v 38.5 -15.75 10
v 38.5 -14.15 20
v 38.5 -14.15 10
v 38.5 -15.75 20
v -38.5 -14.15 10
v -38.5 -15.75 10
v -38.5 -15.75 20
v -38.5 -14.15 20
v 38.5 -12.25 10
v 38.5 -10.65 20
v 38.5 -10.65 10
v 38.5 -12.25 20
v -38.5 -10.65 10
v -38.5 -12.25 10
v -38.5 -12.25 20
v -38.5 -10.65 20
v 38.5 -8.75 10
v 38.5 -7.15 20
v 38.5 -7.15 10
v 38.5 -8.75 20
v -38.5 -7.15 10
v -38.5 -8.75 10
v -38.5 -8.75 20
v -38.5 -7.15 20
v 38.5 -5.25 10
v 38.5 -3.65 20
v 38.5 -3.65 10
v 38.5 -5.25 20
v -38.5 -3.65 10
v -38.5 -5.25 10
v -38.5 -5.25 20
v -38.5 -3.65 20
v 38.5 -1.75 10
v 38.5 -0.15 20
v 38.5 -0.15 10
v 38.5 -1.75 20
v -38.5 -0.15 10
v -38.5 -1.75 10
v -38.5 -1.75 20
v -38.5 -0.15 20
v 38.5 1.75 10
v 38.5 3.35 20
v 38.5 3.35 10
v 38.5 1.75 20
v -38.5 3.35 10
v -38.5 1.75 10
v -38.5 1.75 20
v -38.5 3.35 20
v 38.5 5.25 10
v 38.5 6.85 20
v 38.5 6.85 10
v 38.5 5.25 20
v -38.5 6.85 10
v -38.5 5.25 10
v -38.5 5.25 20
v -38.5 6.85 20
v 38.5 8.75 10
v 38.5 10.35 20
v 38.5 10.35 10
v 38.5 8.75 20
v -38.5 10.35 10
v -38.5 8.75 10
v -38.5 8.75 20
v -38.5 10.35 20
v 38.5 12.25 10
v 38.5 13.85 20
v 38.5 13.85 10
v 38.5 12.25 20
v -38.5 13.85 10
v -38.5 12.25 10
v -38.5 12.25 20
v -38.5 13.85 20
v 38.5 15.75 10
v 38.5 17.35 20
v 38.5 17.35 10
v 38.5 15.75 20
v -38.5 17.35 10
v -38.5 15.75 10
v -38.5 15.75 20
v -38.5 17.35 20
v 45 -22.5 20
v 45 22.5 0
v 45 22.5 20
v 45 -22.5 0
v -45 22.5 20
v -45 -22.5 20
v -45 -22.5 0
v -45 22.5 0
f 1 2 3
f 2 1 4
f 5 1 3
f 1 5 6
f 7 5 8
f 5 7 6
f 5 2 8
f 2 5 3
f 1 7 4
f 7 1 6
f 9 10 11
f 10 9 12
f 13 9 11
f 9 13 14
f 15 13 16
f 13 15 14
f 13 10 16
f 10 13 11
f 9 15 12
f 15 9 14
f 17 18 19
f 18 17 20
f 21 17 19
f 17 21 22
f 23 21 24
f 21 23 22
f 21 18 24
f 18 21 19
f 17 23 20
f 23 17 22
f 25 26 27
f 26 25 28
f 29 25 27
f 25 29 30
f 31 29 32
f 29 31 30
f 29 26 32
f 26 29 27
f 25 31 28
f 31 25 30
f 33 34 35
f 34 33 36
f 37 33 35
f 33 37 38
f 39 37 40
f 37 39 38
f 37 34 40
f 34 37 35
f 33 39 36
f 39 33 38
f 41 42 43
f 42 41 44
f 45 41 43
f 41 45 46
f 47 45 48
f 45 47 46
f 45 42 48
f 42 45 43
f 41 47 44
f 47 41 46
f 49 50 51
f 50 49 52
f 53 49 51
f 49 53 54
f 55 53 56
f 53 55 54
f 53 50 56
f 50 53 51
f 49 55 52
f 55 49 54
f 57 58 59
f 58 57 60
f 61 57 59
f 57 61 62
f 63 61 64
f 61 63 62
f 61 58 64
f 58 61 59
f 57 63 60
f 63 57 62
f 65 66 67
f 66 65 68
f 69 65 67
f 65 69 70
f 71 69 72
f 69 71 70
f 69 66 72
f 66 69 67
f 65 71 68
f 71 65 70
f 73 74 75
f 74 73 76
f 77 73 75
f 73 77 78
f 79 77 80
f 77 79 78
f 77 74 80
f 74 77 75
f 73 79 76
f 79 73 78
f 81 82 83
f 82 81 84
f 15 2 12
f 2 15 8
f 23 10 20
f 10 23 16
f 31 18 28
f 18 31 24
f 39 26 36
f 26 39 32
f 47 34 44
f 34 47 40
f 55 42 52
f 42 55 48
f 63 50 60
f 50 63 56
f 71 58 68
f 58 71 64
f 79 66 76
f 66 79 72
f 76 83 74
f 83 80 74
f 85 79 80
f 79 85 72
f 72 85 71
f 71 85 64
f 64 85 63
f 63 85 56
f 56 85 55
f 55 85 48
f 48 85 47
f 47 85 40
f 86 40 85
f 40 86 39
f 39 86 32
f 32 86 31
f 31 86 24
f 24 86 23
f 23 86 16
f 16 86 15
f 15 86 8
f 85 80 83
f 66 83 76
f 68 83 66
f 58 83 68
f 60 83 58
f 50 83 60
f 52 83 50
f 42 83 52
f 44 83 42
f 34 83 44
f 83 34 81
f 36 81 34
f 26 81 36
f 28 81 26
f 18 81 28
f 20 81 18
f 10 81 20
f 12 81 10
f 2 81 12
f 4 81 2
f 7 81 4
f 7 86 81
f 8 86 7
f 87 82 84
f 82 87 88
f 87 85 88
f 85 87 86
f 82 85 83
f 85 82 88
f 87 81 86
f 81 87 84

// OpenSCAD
// Microscope slide drying rack
// Print orientation: base block on XY plane, slots open upward (+Z)

// ---------- Parameters ----------
block_len   = 90;    // block length along X (mm)
block_wid   = 45;    // block width along Y (mm)
block_ht    = 20;    // block height along Z (mm)

slot_count  = 10;    // number of slide slots
slot_len    = 77;    // slot length along X (mm)
slot_wid    = 1.6;   // slot width along Y (mm)
slot_depth  = 10;    // slot depth from top face (mm)
slot_pitch  = 3.5;   // centre-to-centre slot spacing along Y (mm)

eps         = 0.5;   // overcut past faces to avoid coplanar surfaces (mm)

$fn = 64;

// ---------- Derived ----------
slot_x0 = -slot_len / 2;              // first slot start X
slot_y0 = -(slot_count - 1) * slot_pitch / 2;   // first slot centre Y

// ---------- Model ----------
difference() {
    // Base block
    translate([-block_len / 2, -block_wid / 2, 0])
        cube([block_len, block_wid, block_ht]);

    // Parallel slots along X, centred on block in X and Y
    for (i = [0 : slot_count - 1])
        translate([slot_x0, slot_y0 + i * slot_pitch, block_ht - slot_depth])
            cube([slot_len, slot_wid, slot_depth + eps]);
}
